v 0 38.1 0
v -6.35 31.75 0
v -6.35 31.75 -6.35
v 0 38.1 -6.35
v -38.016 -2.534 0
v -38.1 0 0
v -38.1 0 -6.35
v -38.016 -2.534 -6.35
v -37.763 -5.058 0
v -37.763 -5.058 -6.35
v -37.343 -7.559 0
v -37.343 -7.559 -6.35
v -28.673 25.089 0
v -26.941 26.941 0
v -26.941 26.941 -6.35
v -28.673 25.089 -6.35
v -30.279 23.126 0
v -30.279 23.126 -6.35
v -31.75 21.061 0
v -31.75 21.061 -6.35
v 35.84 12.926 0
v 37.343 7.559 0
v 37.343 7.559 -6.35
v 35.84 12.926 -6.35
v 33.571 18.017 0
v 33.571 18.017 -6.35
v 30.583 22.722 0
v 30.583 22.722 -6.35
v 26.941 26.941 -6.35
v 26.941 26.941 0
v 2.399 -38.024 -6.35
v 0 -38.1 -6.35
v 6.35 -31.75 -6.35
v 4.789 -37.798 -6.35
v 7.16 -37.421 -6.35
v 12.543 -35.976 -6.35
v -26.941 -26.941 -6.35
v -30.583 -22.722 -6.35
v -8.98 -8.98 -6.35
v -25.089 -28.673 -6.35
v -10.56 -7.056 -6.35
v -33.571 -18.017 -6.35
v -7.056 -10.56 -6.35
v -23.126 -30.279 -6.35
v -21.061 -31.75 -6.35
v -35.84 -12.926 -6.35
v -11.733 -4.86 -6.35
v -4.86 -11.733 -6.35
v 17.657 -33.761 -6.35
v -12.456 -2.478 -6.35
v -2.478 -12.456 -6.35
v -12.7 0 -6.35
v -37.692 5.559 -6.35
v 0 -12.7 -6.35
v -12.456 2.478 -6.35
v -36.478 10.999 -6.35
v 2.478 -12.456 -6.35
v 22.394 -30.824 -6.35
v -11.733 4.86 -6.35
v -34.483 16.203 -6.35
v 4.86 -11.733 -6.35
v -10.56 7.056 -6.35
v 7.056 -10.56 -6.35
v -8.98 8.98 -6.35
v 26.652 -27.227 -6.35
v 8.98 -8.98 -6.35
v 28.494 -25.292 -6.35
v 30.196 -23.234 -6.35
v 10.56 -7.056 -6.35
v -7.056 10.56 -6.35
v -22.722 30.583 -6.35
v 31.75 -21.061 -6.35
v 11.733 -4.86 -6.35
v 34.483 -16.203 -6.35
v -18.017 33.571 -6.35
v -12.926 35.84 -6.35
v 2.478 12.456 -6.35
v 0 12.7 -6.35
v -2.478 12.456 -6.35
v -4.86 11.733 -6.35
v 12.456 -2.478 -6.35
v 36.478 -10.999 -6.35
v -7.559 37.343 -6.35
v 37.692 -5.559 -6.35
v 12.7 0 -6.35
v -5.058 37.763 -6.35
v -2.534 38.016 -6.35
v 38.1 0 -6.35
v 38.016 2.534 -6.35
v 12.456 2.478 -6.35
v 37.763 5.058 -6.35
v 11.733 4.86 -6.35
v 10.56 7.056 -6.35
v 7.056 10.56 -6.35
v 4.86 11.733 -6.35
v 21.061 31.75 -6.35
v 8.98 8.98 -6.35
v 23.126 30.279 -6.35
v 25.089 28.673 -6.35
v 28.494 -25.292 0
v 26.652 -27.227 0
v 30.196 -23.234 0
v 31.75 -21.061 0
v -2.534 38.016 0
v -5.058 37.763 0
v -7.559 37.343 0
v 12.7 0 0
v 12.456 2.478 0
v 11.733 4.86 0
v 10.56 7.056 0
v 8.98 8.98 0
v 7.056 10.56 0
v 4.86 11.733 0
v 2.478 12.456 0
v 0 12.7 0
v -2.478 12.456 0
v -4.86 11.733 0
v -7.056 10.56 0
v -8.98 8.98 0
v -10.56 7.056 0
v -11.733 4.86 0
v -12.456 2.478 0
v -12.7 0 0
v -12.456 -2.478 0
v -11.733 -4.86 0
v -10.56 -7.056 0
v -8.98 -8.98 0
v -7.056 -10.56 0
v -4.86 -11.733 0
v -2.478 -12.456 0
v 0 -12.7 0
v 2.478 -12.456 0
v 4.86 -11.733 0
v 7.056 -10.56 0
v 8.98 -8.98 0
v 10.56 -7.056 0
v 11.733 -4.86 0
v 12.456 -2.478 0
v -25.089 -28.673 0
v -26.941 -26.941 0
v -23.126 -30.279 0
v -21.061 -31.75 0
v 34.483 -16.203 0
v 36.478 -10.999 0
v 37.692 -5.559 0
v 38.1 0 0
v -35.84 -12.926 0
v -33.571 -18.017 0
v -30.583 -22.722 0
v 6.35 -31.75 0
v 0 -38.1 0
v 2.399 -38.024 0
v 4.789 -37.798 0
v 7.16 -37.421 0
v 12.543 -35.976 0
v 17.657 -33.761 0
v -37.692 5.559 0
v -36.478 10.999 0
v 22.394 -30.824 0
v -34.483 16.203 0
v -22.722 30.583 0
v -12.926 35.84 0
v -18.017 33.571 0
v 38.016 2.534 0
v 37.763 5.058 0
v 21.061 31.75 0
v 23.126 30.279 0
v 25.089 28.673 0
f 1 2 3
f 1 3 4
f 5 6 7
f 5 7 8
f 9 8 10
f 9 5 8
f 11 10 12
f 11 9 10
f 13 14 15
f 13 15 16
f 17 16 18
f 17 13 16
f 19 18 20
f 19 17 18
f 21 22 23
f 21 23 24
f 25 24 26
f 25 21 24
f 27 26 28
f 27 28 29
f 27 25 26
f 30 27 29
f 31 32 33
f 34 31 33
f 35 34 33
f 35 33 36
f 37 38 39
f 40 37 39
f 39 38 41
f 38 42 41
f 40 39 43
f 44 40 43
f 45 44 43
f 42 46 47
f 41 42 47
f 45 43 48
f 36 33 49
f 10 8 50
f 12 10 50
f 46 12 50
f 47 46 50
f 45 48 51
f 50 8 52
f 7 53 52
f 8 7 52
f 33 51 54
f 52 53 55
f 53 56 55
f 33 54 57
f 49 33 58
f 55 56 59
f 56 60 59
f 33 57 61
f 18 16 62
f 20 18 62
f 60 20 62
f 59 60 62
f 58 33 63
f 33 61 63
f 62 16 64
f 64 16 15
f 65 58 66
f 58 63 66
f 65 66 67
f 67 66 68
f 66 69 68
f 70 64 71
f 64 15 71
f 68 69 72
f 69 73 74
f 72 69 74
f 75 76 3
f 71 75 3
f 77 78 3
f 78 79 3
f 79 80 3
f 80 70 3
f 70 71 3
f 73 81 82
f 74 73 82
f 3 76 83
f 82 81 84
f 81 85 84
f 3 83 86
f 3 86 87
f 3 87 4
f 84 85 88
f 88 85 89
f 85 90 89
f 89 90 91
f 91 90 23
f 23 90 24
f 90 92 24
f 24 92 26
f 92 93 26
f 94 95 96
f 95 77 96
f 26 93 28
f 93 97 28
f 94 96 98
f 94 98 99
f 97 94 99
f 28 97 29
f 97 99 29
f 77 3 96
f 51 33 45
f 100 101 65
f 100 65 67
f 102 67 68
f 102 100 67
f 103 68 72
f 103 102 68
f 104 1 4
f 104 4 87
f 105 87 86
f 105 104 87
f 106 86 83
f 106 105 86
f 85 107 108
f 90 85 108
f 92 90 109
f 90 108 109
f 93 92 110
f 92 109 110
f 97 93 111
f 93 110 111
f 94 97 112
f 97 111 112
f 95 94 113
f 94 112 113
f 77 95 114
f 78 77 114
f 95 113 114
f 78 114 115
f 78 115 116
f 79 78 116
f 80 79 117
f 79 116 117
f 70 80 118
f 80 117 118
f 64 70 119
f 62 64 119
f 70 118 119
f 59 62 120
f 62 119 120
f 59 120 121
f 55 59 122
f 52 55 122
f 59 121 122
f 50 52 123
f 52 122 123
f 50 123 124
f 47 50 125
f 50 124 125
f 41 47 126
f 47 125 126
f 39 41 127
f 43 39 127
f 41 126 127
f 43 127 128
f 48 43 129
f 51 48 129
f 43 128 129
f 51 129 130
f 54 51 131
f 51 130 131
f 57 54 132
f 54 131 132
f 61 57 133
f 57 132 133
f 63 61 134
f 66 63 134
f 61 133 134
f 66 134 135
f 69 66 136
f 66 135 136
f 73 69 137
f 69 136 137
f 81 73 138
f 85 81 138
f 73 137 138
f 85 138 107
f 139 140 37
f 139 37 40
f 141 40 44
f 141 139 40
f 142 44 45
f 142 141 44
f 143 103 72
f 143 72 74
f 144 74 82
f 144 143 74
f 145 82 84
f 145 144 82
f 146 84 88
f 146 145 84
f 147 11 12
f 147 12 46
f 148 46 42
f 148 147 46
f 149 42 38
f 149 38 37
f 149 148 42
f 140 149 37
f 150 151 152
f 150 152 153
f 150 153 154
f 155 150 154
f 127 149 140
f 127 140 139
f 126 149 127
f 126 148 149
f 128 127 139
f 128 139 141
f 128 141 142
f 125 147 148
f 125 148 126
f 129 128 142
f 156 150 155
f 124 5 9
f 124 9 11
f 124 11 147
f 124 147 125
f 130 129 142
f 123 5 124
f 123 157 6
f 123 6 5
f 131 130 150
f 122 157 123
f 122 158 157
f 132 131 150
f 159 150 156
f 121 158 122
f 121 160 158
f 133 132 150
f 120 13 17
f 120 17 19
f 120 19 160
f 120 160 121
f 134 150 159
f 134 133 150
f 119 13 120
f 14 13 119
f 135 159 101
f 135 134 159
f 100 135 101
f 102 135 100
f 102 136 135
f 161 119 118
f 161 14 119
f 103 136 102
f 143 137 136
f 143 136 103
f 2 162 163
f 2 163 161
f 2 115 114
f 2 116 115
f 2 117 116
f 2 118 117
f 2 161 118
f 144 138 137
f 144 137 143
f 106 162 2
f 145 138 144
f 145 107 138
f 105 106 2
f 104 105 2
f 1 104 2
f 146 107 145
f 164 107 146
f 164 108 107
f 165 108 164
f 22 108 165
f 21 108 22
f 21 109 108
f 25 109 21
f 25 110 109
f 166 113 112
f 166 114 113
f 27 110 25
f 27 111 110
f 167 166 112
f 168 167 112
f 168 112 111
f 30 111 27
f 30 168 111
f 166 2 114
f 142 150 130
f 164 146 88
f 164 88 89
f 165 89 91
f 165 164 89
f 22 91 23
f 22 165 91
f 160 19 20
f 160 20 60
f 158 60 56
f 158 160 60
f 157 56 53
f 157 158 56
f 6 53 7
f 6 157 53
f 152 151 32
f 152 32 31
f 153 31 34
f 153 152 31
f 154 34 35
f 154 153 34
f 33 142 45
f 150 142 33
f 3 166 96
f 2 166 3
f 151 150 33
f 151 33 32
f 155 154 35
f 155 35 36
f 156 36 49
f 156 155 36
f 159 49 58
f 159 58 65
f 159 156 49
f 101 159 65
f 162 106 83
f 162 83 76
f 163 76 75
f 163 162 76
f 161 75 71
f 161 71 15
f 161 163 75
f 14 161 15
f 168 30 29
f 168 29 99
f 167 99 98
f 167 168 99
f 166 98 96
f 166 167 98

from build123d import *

# Parameters (mm, degrees)
F0_R     = 12.7
F1_DEPTH = 6.35


with BuildPart() as f1:
    # F0 (on Top) → F1 (new body)
    with BuildSketch(Plane.XY):
        with BuildLine():
            Line((22.45064, 22.45064), (37.34271, 7.55857))
            ThreePointArc((37.34271, 7.55857), (33.570952, 18.016692), (26.940768, 26.940768))
            Line((26.940768, 26.940768), (17.960512, 26.940768))
            Line((17.960512, 26.940768), (22.45064, 22.45064))
        make_face()
        with BuildLine():
            ThreePointArc((-37.34271, -7.55857), (-33.570952, -18.016692), (-26.940768, -26.940768))
            Line((-26.940768, -26.940768), (-17.960512, -26.940768))
            Line((-17.960512, -26.940768), (-22.45064, -22.45064))
            Line((-22.45064, -22.45064), (-37.34271, -7.55857))
        make_face()
        with BuildLine():
            ThreePointArc((7.159566, -37.421259), (17.657349, -33.761339), (26.651684, -27.226783))
            Line((26.651684, -27.226783), (26.747534, -18.247039))
            Line((26.747534, -18.247039), (22.209737, -22.688986))
            Line((22.209737, -22.688986), (7.159566, -37.421259))
        make_face()
        with BuildLine():
            Line((-22.45064, 22.45064), (-7.55857, 37.34271))
            ThreePointArc((-7.55857, 37.34271), (-18.016692, 33.570952), (-26.940768, 26.940768))
            Line((-26.940768, 26.940768), (-26.940768, 17.960512))
            Line((-26.940768, 17.960512), (-22.45064, 22.45064))
        make_face()
        with BuildLine():
            Line((31.75, 6.35), (38.1, 0))
            ThreePointArc((38.1, 0), (37.910205, 3.798206), (37.34271, 7.55857))
            Line((37.34271, 7.55857), (22.45064, 22.45064))
            Line((22.45064, 22.45064), (17.960512, 26.940768))
            Line((17.960512, 26.940768), (26.940768, 26.940768))
            ThreePointArc((26.940768, 26.940768), (24.120826, 29.4923), (21.060567, 31.75))
            Line((21.060567, 31.75), (0, 31.75))
            Line((0, 31.75), (-6.35, 31.75))
            Line((-6.35, 31.75), (0, 38.1))
            ThreePointArc((0, 38.1), (-3.798206, 37.910205), (-7.55857, 37.34271))
            Line((-7.55857, 37.34271), (-22.45064, 22.45064))
            Line((-22.45064, 22.45064), (-26.940768, 17.960512))
            Line((-26.940768, 17.960512), (-26.940768, 26.940768))
            ThreePointArc((-26.940768, 26.940768), (-29.4923, 24.120826), (-31.75, 21.060567))
            Line((-31.75, 21.060567), (-31.75, 0))
            Line((-31.75, 0), (-31.75, -6.35))
            Line((-31.75, -6.35), (-38.1, 0))
            ThreePointArc((-38.1, 0), (-37.910205, -3.798206), (-37.34271, -7.55857))
            Line((-37.34271, -7.55857), (-22.45064, -22.45064))
            Line((-22.45064, -22.45064), (-17.960512, -26.940768))
            Line((-17.960512, -26.940768), (-26.940768, -26.940768))
            ThreePointArc((-26.940768, -26.940768), (-24.120826, -29.4923), (-21.060567, -31.75))
            Line((-21.060567, -31.75), (0, -31.75))
            Line((0, -31.75), (6.35, -31.75))
            Line((6.35, -31.75), (0, -38.1))
            ThreePointArc((0, -38.1), (3.595834, -37.929935), (7.159566, -37.421259))
            Line((7.159566, -37.421259), (22.209737, -22.688986))
            Line((22.209737, -22.688986), (26.747534, -18.247039))
            Line((26.747534, -18.247039), (26.651684, -27.226783))
            ThreePointArc((26.651684, -27.226783), (29.363153, -24.277876), (31.75, -21.060567))
            Line((31.75, -21.060567), (31.75, 0))
            Line((31.75, 0), (31.75, 6.35))
        make_face()
        Circle(F0_R, mode=Mode.SUBTRACT)
        with BuildLine():
            ThreePointArc((31.75, -21.060567), (36.477973, -10.998523), (38.1, 0))
            Line((38.1, 0), (31.75, 6.35))
            Line((31.75, 6.35), (31.75, 0))
            Line((31.75, 0), (31.75, -21.060567))
        make_face()
        with BuildLine():
            Line((-31.75, 0), (-31.75, 21.060567))
            ThreePointArc((-31.75, 21.060567), (-36.477973, 10.998523), (-38.1, 0))
            Line((-38.1, 0), (-31.75, -6.35))
            Line((-31.75, -6.35), (-31.75, 0))
        make_face()
    extrude(amount=-F1_DEPTH)


solid = f1.part
